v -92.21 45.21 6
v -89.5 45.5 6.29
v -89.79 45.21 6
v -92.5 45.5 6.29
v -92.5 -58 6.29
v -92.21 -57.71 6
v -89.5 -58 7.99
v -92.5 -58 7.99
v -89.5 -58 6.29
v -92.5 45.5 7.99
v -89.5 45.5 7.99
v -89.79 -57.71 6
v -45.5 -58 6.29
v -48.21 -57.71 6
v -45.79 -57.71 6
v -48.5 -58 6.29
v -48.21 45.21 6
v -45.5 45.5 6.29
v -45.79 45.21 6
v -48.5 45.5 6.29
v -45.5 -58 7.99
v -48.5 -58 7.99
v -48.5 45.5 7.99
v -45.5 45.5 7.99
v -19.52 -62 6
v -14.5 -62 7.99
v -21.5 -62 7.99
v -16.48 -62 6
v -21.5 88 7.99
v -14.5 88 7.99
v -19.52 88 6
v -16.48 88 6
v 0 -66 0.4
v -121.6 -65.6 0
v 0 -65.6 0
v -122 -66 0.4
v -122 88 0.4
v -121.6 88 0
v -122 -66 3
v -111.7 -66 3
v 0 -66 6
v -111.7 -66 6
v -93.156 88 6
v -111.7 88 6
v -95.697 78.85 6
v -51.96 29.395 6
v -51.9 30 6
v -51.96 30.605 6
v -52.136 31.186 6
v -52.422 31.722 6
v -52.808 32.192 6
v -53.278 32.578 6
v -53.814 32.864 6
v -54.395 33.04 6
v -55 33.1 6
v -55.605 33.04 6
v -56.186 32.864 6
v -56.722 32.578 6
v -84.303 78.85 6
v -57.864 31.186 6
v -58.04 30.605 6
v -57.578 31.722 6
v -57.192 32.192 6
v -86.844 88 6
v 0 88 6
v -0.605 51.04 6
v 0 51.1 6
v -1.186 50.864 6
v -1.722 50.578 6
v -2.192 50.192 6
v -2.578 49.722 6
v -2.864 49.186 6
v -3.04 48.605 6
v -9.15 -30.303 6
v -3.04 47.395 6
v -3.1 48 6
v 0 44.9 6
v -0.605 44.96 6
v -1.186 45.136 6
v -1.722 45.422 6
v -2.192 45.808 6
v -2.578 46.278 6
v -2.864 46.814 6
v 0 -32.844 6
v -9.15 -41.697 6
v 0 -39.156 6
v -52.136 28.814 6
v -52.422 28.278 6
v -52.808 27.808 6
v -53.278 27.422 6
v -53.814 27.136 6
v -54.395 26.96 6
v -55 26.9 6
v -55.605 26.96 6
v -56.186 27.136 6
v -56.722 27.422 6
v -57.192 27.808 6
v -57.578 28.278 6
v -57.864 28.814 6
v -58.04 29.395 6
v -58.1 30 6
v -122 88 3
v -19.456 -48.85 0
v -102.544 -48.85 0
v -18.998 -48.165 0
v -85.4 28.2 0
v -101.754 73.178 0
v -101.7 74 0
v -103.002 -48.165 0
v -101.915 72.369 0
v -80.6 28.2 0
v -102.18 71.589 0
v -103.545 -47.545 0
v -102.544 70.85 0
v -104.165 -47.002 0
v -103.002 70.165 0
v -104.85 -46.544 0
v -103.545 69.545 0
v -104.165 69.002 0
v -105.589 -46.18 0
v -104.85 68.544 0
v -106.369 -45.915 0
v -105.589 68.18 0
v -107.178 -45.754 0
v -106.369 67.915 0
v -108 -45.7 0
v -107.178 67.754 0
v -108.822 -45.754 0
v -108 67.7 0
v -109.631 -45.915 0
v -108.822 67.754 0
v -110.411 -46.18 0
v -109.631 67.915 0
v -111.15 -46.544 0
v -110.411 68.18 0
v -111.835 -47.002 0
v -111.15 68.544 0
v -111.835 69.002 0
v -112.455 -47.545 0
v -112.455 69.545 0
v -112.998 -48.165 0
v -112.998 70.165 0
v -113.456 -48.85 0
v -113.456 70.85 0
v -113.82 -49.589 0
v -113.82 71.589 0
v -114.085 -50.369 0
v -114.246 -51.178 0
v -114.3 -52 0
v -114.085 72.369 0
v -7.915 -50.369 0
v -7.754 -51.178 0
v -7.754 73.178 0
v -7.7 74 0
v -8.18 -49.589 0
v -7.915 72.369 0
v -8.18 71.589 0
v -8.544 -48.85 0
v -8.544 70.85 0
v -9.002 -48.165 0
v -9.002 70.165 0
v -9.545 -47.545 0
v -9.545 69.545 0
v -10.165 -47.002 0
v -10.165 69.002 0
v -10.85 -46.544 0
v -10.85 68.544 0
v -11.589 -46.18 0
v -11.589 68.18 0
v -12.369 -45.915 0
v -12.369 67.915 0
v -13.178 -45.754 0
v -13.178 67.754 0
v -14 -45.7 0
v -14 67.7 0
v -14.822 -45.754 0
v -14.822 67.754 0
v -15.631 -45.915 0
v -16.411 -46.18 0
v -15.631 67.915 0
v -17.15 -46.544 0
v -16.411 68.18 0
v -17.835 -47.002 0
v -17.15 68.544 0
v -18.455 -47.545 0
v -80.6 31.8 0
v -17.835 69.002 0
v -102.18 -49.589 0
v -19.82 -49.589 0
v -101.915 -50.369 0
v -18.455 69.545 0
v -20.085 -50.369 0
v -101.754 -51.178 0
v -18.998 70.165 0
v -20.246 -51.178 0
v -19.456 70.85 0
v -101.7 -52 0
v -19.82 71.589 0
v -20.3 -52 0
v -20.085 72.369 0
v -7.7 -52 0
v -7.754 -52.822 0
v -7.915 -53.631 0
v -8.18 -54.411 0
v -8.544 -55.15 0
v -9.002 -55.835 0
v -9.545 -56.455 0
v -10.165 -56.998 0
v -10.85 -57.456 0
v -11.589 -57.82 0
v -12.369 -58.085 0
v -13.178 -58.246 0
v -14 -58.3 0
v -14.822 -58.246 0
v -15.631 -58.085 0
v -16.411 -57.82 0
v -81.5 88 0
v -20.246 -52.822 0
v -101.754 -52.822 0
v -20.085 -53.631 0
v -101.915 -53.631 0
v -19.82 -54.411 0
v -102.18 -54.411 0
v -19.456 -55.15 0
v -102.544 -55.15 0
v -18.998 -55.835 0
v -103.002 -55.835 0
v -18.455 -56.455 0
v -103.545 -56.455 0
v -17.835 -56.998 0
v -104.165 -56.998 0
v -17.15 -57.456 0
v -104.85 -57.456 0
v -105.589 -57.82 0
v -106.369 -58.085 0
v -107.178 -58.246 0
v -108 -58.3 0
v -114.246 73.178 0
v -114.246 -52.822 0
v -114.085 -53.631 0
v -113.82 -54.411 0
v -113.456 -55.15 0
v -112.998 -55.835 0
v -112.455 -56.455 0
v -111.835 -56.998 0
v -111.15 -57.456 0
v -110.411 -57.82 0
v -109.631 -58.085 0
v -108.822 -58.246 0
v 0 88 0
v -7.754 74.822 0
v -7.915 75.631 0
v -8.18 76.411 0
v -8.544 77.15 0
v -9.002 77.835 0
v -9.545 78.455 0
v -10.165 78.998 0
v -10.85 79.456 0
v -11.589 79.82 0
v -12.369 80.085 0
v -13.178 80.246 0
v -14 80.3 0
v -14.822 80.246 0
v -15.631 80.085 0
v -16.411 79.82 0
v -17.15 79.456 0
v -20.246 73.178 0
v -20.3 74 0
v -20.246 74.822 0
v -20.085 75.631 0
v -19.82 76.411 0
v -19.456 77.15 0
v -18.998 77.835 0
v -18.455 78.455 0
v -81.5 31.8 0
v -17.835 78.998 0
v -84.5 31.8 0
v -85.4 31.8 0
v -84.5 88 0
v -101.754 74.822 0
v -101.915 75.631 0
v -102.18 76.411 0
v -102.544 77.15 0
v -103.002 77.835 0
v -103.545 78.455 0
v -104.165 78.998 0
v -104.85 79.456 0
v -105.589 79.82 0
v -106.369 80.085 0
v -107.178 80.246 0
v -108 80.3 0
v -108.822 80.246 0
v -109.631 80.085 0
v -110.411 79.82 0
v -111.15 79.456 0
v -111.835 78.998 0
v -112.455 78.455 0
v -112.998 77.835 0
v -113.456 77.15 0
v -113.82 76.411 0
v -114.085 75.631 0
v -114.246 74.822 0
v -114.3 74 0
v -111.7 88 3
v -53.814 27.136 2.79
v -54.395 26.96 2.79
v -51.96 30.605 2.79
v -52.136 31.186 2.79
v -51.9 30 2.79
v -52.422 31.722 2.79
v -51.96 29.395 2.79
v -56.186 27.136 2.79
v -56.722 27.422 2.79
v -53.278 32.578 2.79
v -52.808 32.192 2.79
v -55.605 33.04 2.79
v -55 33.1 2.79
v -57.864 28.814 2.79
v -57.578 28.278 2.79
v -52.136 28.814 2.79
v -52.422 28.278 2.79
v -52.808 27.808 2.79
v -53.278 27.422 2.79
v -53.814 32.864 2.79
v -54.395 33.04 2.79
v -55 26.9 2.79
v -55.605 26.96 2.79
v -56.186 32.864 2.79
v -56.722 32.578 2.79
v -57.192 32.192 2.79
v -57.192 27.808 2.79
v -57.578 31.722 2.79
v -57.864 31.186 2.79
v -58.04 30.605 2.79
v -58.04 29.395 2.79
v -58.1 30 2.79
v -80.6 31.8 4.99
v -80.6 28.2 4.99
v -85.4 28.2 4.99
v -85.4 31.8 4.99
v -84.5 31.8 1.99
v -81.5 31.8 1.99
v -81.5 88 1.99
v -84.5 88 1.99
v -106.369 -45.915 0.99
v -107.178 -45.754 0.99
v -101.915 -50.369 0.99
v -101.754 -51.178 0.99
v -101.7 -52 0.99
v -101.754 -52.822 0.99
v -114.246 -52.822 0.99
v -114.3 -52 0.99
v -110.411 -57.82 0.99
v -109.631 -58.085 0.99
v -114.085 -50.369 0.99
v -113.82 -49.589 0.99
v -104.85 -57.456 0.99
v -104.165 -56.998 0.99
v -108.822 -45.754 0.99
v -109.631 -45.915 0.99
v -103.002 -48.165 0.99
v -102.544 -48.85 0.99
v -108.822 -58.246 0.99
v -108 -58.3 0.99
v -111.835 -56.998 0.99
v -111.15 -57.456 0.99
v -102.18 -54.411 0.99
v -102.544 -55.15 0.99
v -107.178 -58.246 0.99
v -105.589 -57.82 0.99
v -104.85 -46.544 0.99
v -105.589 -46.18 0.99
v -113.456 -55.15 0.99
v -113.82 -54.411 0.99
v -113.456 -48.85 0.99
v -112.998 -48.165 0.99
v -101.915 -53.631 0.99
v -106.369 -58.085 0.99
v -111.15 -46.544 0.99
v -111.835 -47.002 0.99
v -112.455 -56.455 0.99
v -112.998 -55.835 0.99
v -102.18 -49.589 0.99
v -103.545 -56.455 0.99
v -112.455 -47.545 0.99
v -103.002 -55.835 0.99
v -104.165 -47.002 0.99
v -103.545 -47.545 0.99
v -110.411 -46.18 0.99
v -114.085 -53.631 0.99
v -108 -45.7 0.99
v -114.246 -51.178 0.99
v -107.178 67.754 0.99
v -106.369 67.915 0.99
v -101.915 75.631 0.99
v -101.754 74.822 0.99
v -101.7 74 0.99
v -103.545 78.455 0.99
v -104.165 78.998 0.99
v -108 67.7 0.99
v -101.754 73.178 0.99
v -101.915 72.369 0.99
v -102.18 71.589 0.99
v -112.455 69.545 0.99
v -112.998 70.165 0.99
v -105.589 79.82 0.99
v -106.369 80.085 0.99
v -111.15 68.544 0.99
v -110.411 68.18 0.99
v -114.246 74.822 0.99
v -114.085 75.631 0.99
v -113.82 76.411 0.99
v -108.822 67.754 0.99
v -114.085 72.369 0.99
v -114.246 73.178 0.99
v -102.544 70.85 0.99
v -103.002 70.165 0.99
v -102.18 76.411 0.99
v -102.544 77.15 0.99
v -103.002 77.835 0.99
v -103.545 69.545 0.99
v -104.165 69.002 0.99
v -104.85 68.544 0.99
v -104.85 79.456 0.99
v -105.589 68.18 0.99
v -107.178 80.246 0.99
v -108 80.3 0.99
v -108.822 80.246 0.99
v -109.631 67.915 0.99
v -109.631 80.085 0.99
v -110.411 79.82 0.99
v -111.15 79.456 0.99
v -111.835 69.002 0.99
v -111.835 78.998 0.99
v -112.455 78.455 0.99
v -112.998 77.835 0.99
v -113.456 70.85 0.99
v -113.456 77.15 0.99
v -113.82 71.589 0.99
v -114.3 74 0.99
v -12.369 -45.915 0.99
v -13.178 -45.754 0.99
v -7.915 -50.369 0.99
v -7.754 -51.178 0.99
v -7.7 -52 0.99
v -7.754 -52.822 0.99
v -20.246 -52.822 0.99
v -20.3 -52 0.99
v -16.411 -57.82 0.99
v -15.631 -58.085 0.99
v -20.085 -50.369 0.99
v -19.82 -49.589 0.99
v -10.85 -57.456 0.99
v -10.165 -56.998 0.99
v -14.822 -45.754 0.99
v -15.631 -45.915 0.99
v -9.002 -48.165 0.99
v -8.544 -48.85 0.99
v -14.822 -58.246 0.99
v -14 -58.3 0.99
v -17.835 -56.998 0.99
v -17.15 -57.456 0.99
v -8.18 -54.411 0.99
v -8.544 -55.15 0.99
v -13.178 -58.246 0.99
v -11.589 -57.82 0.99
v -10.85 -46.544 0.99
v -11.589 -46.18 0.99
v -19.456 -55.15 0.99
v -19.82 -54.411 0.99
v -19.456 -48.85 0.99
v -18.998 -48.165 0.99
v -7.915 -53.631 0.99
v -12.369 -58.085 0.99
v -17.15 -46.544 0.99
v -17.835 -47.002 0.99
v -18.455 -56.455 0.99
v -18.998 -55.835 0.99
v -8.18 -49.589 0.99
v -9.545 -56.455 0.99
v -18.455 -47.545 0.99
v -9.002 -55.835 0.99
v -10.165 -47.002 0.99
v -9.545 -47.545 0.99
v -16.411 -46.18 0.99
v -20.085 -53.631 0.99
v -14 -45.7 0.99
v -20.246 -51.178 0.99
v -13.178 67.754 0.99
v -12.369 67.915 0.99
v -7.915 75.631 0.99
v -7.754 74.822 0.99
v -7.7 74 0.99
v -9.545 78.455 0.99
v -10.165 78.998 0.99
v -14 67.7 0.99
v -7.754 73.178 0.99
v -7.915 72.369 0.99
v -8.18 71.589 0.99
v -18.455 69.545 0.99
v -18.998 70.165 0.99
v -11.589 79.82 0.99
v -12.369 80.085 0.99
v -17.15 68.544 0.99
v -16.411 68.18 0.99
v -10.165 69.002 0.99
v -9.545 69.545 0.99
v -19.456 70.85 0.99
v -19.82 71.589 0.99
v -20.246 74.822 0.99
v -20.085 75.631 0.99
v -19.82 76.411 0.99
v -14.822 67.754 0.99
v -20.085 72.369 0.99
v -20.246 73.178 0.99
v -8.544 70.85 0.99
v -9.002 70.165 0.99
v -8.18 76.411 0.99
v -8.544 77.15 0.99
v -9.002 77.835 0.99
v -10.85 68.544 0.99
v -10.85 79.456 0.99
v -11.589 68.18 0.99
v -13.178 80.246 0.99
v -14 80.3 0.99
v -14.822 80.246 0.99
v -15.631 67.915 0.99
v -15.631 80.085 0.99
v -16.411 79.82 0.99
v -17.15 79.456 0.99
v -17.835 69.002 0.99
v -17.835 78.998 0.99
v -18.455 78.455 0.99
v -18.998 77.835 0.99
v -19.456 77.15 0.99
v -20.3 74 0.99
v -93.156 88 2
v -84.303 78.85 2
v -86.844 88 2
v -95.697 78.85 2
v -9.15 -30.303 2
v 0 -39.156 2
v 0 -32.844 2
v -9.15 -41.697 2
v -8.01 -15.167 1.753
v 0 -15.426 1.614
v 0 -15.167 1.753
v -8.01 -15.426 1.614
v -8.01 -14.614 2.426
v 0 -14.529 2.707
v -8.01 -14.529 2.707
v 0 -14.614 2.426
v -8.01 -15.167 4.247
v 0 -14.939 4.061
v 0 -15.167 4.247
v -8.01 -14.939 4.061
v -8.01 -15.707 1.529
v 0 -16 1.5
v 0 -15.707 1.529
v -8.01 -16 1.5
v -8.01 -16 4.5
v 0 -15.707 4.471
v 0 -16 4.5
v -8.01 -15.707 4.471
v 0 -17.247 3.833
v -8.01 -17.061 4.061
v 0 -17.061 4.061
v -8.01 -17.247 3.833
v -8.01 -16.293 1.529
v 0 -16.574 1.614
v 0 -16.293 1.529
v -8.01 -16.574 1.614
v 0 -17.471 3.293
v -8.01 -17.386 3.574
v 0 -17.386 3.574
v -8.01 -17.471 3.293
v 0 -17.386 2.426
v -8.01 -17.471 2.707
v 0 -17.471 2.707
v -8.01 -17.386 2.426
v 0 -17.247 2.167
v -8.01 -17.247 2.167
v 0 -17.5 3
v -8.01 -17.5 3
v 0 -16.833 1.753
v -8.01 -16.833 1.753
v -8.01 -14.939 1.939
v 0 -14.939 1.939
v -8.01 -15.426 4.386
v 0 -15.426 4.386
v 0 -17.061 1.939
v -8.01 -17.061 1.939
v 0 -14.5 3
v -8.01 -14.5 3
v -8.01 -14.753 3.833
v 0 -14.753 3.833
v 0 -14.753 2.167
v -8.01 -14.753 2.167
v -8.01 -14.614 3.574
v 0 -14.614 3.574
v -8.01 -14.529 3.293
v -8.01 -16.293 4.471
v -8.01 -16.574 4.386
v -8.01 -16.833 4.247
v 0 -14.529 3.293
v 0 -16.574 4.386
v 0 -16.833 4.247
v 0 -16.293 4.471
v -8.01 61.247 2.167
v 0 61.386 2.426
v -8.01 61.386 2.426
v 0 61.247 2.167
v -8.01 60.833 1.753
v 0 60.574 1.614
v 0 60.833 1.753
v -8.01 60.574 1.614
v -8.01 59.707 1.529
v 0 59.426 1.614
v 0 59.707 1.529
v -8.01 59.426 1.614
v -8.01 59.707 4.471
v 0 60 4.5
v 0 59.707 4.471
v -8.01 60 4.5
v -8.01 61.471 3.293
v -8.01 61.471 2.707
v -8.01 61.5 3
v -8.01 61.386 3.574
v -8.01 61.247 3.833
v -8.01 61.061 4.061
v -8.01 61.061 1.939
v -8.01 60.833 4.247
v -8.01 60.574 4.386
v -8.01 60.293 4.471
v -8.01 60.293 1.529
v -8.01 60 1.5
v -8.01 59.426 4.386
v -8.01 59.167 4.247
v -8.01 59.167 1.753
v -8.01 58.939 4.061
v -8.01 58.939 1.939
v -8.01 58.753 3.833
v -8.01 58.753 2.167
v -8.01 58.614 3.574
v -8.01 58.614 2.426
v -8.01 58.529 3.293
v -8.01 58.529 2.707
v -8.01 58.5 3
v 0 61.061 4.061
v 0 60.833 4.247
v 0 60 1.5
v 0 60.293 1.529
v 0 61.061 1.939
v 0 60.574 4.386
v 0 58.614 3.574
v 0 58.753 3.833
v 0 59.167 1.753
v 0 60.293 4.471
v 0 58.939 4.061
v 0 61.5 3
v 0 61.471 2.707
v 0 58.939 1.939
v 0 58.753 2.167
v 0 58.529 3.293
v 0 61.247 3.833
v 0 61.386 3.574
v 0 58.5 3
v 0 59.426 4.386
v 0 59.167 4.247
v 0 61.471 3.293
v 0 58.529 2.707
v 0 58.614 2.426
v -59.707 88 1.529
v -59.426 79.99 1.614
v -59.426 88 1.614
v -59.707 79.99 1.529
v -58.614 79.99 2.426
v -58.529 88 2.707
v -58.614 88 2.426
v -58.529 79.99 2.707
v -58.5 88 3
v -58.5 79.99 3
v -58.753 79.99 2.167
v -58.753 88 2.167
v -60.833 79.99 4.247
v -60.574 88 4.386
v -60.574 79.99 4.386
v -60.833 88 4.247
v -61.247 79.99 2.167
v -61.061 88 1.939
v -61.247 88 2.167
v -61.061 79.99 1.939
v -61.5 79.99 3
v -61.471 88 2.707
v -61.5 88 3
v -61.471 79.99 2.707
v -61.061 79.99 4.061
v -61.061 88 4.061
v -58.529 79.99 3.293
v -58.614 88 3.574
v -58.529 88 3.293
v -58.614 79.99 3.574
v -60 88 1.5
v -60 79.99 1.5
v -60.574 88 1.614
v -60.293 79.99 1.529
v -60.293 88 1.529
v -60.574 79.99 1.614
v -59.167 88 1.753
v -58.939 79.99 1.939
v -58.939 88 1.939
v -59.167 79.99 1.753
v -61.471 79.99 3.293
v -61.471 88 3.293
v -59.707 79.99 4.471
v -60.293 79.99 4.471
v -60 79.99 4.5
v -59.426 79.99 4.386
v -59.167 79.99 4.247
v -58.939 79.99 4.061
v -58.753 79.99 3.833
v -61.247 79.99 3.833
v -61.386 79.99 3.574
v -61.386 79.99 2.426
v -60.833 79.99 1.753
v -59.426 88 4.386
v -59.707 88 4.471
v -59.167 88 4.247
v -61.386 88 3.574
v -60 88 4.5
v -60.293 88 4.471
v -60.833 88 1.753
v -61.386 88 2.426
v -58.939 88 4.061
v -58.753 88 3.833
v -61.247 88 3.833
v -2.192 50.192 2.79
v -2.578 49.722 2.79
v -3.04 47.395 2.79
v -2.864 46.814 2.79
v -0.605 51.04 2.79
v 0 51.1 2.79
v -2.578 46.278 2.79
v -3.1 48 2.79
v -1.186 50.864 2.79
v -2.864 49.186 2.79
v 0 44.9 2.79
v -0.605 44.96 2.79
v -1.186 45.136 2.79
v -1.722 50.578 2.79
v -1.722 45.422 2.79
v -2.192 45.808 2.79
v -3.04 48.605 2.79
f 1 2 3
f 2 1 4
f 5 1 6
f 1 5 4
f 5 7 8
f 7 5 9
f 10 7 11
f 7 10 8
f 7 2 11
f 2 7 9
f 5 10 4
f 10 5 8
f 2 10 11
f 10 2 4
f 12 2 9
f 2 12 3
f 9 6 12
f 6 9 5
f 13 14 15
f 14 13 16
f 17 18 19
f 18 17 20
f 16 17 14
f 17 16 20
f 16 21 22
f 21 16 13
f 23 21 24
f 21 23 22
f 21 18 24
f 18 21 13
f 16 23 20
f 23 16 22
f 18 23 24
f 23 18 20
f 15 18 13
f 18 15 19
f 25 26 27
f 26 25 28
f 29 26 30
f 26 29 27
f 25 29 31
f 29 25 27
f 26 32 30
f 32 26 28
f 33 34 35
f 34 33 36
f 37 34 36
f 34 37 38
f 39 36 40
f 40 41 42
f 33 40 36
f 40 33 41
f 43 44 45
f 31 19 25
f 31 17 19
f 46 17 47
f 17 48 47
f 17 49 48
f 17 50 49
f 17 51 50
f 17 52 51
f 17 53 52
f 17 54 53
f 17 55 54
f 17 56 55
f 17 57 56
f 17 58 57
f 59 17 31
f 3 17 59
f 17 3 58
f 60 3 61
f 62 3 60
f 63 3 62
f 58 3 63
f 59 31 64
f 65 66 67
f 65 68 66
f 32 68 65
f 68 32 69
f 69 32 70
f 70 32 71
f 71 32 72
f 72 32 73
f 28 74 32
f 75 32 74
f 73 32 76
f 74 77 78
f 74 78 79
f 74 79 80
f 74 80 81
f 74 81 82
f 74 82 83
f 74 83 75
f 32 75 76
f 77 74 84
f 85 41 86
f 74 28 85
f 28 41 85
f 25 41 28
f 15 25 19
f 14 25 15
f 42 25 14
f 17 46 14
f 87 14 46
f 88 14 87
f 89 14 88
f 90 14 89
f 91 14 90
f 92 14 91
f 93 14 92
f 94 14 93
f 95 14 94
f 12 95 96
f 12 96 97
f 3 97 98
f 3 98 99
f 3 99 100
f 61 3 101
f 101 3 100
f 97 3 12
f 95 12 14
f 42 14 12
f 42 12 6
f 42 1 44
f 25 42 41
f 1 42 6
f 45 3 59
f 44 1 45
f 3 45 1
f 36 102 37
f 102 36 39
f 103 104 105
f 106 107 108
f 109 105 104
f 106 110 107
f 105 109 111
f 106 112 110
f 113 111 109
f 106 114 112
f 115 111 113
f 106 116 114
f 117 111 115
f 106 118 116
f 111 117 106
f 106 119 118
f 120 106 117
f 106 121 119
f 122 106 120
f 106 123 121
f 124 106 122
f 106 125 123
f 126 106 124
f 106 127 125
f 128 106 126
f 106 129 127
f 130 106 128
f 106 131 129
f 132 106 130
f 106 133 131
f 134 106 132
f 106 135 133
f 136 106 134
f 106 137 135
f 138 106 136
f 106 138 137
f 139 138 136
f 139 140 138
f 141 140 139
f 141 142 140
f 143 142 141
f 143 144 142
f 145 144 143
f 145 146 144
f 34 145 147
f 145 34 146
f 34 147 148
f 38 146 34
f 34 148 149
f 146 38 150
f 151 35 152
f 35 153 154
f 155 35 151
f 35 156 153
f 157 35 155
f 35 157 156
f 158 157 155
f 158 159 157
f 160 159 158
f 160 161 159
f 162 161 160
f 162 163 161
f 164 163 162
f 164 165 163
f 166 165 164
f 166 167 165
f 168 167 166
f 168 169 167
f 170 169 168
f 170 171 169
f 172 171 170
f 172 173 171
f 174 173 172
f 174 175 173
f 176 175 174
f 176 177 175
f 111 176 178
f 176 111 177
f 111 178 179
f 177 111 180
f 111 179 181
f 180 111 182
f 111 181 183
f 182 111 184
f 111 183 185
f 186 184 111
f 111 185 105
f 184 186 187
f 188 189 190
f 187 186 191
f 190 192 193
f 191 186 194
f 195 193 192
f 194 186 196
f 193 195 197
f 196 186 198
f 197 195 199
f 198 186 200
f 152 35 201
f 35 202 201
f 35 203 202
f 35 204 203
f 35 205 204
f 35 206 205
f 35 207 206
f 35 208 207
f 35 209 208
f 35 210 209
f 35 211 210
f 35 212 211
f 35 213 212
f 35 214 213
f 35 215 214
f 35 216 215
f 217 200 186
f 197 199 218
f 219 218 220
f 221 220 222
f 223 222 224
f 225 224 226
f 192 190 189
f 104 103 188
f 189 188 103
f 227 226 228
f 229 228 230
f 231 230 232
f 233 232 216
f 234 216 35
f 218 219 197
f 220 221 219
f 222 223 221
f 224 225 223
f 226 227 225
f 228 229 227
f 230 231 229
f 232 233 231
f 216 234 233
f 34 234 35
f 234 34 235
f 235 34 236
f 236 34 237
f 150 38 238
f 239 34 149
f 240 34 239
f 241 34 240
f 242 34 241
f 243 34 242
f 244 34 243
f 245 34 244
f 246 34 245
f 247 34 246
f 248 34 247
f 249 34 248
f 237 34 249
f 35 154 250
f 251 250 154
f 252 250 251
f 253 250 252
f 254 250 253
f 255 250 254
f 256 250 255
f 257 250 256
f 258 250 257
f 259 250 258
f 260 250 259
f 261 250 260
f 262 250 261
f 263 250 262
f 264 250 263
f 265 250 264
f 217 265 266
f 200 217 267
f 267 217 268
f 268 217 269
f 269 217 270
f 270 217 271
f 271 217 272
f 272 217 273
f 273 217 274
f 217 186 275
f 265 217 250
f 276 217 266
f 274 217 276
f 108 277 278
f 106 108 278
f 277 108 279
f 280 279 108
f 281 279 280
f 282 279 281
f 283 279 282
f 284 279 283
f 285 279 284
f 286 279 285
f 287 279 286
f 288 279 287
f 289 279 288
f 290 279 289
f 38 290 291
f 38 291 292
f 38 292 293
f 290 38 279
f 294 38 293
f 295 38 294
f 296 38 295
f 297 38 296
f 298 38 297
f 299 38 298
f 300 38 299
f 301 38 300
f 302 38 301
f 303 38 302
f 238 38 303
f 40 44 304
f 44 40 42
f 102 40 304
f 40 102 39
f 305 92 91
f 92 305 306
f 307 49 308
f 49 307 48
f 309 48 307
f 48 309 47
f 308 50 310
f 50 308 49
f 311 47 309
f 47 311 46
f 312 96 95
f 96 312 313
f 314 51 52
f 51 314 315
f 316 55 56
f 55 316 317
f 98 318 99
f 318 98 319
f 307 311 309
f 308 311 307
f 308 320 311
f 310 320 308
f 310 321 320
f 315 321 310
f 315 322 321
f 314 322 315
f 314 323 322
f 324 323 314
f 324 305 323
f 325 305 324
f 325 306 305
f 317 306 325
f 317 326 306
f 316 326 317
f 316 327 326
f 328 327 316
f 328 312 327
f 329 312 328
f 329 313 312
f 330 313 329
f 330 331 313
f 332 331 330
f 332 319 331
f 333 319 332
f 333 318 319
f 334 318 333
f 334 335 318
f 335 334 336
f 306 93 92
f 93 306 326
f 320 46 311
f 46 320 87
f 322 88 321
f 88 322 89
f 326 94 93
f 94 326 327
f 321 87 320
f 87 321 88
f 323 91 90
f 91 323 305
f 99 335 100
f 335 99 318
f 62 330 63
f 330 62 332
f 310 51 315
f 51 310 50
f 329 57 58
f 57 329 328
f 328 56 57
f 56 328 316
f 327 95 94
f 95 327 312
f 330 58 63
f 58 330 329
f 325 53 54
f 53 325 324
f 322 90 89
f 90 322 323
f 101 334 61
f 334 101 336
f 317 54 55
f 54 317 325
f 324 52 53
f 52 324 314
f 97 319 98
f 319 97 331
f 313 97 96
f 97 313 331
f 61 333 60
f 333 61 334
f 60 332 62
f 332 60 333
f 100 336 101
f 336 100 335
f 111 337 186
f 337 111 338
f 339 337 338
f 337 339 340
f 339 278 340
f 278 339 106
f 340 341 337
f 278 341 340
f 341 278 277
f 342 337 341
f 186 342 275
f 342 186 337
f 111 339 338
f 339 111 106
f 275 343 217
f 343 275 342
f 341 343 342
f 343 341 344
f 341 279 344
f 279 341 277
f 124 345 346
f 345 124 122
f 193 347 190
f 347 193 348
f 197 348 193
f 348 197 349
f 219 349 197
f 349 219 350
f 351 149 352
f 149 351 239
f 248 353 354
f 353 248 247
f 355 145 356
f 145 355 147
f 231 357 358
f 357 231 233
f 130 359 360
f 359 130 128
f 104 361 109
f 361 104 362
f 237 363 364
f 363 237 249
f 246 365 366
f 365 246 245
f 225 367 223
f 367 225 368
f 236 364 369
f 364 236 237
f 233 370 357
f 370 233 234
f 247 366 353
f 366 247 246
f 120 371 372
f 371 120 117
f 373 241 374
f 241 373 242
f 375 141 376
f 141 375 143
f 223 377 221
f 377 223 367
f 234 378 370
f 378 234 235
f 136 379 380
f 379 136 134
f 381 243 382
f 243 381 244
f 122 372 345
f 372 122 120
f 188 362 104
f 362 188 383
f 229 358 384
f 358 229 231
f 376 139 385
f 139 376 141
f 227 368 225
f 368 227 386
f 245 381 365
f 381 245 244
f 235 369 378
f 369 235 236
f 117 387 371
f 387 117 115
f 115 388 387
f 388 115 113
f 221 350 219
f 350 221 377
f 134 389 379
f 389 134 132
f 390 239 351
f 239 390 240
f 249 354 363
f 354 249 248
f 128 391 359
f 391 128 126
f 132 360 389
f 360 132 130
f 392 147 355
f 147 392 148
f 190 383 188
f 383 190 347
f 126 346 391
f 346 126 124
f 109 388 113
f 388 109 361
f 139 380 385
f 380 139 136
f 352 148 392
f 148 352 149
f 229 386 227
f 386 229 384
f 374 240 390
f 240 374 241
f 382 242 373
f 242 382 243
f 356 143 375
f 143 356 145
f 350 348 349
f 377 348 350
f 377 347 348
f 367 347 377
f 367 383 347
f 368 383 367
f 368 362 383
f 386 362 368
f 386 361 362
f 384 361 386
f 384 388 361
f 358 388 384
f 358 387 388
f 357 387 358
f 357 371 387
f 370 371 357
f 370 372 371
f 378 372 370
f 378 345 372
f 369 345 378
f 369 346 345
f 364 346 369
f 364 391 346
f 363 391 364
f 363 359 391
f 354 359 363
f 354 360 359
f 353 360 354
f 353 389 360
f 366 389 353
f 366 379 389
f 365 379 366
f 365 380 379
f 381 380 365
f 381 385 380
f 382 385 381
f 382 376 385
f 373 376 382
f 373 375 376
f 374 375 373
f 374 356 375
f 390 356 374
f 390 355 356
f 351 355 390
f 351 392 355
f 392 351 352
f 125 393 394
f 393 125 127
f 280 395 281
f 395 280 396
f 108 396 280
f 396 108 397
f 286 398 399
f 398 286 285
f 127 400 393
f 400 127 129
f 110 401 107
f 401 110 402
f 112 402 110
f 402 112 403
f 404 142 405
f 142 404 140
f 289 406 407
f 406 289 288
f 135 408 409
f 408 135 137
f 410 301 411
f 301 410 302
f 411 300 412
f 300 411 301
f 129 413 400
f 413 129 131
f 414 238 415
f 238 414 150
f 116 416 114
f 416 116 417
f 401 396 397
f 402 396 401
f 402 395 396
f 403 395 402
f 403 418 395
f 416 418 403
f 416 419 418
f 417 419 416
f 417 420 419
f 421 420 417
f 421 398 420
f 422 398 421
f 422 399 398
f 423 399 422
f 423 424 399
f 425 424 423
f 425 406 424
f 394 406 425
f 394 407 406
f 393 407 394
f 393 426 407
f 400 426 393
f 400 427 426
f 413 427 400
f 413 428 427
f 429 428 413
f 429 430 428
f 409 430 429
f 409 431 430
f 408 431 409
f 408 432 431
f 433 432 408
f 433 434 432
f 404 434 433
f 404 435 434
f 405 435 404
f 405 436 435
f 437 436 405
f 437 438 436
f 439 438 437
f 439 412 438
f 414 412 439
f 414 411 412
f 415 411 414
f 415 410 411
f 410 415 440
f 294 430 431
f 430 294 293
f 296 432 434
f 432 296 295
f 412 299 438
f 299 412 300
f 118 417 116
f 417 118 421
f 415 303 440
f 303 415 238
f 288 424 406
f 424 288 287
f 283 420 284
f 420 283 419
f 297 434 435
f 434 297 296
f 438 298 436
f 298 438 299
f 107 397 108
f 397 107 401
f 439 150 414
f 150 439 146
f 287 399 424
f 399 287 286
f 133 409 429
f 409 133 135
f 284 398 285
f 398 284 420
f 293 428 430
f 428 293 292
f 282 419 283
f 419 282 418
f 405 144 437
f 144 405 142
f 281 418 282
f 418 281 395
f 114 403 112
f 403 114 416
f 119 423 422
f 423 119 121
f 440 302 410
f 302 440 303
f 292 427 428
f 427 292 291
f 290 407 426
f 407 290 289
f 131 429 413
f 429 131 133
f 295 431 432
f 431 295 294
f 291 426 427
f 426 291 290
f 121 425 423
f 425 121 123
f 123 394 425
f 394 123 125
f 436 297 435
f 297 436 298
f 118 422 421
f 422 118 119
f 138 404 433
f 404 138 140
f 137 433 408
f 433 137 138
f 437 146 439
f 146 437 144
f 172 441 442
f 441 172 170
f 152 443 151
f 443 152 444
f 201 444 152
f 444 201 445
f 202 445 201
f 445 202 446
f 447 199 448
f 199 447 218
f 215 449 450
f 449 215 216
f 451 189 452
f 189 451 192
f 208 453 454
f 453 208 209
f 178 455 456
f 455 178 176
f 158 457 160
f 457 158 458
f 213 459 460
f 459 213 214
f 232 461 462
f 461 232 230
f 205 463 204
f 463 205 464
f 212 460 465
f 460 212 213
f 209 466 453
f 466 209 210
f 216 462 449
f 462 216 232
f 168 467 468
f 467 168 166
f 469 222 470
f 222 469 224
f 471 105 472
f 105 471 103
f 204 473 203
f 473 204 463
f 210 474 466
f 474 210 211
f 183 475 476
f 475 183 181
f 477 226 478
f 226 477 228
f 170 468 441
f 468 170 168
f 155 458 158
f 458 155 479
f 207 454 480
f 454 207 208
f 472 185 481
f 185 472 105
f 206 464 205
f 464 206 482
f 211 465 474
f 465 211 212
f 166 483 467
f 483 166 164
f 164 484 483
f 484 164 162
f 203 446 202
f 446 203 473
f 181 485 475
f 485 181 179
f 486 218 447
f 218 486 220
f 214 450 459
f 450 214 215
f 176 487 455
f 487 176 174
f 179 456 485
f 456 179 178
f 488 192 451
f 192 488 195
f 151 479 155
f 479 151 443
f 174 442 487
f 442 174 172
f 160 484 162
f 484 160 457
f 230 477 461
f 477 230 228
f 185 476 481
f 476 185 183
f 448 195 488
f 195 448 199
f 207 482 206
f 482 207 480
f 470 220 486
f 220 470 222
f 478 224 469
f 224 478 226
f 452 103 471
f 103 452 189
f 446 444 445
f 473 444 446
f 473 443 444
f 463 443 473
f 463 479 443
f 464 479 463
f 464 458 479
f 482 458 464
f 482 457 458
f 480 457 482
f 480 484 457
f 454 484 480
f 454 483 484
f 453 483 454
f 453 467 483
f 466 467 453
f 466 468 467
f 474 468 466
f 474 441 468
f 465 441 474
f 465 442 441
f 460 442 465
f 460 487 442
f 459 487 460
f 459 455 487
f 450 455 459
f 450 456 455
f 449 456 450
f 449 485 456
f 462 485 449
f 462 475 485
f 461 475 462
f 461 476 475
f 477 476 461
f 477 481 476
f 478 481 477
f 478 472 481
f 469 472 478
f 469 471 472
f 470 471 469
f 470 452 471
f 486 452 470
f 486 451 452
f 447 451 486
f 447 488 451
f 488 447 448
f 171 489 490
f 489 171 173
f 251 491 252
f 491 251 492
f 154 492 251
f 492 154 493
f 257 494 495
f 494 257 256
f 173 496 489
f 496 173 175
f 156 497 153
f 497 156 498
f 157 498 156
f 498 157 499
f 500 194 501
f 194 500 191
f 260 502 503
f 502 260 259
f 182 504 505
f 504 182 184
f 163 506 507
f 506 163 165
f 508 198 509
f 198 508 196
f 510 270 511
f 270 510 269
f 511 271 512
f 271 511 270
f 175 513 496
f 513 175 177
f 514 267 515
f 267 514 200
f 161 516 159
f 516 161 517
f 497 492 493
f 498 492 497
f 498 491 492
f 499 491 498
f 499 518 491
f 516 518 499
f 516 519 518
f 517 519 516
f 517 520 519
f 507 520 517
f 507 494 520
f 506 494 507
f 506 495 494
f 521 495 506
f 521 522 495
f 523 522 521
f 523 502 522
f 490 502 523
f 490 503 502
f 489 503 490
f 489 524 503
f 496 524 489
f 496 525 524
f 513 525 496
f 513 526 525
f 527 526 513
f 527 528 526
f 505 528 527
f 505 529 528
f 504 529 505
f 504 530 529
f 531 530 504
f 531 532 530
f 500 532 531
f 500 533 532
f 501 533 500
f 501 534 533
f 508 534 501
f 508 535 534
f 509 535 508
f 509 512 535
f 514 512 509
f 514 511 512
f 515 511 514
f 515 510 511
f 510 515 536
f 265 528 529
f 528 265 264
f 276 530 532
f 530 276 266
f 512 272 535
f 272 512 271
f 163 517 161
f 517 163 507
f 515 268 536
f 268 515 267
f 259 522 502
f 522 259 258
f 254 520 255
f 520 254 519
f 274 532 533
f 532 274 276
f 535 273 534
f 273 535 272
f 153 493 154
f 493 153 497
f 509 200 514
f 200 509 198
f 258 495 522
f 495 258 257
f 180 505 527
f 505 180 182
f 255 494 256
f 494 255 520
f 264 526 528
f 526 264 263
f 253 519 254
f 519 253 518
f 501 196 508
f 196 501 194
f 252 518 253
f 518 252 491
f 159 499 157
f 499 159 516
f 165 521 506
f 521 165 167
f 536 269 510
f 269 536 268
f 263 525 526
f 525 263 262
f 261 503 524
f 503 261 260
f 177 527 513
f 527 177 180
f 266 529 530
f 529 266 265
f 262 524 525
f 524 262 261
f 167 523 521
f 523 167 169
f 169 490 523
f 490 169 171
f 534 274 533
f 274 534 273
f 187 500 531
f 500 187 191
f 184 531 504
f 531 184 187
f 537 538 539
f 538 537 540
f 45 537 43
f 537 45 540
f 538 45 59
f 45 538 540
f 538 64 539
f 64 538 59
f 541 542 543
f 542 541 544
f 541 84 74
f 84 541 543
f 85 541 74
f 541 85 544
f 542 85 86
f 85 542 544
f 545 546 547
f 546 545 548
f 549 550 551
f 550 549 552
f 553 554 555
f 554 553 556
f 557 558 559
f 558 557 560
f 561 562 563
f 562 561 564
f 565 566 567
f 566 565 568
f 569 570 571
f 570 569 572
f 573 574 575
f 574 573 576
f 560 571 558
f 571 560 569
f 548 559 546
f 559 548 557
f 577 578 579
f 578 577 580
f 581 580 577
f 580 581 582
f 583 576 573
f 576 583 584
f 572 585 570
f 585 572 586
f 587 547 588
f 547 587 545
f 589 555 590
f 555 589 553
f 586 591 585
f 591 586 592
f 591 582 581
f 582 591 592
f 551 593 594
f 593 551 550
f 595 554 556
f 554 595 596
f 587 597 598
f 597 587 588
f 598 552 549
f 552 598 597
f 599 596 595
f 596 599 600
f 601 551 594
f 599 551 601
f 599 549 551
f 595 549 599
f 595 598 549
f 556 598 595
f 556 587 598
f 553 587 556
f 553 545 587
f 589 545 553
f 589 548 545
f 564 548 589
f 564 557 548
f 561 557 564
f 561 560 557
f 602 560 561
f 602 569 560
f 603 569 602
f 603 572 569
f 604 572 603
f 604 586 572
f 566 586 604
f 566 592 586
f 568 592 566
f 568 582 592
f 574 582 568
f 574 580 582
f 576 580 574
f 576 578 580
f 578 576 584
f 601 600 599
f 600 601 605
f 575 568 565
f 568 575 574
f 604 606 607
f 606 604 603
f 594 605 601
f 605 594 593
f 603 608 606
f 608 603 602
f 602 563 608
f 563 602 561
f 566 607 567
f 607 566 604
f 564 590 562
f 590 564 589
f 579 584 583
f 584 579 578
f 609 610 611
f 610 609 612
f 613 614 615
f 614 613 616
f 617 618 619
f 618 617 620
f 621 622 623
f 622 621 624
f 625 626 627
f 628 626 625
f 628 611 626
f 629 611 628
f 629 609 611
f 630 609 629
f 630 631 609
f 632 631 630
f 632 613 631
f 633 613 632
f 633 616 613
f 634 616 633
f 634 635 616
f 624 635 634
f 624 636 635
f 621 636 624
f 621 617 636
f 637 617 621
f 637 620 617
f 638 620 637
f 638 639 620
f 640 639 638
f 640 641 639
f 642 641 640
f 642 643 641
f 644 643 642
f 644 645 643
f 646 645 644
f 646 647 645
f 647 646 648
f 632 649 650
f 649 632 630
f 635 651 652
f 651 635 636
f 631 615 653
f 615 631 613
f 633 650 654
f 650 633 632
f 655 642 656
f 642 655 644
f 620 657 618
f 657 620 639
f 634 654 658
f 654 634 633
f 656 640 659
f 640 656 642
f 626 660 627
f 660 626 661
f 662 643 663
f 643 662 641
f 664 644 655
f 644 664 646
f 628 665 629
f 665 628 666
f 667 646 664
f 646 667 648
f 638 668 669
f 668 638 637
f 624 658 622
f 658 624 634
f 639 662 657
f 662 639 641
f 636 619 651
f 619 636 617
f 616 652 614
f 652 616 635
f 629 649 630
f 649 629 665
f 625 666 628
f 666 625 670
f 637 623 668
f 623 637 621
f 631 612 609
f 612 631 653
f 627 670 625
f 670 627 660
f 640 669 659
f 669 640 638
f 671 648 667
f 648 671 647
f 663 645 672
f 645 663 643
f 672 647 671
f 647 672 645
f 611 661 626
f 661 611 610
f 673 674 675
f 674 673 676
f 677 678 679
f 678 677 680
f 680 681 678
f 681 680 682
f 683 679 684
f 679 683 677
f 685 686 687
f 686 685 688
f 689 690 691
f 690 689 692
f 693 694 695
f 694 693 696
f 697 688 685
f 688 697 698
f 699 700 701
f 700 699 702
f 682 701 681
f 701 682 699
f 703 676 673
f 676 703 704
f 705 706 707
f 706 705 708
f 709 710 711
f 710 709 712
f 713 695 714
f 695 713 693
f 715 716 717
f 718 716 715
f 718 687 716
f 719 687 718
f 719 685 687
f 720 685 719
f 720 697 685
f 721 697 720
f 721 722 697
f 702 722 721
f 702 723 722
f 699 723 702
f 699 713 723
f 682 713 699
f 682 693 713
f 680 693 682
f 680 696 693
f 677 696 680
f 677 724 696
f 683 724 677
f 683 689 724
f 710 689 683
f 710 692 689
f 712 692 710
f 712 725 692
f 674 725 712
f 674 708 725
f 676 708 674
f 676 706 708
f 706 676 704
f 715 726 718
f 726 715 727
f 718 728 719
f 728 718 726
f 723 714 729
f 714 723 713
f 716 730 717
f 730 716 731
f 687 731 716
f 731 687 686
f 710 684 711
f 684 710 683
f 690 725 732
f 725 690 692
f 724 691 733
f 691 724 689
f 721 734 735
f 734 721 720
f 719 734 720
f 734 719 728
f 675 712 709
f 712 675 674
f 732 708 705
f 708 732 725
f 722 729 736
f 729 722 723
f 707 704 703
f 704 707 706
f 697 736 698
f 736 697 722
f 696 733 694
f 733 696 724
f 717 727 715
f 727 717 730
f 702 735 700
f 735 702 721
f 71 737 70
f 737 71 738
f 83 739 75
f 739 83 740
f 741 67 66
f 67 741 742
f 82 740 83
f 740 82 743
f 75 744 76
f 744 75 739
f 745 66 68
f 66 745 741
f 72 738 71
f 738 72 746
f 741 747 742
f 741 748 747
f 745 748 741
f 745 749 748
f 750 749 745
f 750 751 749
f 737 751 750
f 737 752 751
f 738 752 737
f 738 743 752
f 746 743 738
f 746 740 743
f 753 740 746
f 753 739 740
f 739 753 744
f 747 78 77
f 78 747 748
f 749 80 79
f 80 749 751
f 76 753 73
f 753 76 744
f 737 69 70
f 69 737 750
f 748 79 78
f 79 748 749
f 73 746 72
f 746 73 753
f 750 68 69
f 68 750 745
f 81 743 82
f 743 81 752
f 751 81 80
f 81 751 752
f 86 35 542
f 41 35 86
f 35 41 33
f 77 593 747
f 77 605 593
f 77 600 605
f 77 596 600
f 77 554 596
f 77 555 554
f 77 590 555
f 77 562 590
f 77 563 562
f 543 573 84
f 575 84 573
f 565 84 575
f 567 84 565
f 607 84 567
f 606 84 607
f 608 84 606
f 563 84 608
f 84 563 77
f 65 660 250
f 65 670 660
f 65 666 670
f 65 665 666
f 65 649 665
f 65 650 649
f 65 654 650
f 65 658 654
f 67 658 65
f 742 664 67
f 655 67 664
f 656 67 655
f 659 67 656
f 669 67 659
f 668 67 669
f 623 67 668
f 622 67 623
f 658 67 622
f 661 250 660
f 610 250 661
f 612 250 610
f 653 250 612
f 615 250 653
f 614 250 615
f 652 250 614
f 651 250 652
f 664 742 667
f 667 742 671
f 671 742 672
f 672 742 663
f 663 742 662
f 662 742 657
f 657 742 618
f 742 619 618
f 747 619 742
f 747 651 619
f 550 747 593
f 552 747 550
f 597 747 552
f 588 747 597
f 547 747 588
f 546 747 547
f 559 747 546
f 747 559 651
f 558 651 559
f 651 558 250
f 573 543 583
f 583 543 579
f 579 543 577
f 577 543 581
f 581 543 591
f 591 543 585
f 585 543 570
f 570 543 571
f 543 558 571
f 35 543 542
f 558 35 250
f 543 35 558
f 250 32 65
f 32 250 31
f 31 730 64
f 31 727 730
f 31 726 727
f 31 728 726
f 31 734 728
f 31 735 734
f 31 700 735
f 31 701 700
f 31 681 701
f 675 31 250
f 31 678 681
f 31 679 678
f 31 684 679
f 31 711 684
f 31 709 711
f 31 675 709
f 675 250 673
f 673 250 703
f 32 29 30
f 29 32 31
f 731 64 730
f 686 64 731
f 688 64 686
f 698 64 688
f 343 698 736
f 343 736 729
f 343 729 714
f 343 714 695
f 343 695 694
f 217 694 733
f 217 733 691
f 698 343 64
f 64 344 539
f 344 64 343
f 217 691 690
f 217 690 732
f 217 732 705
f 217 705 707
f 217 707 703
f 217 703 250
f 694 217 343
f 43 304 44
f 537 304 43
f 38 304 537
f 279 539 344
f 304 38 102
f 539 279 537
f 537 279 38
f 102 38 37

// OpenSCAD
// Sorter Mk2, one part (or one small set) at a time in machine coordinates, for the picture
// assembly guide (guide/build_guide.py): openscad -D 'a="..."' -o w/a_<name>.stl scene_atoms.scad
include <etray.scad>      // brings joints + layout, and the tray's board positions
use <frame.scad>
use <levels.scad>
use <scan.scad>
use <feeder.scad>
use <covers.scad>
part = "none";            // etray.scad draws nothing
a = "base_fl";

// as frame.scad / levels.scad (variables don't pass through `use`)
zrows = [[wall_z0, seam_z[0]], [seam_z[0], seam_z[1]], [seam_z[1], top_z]];
ycols = [[front_y, seam_y], [seam_y, back_y]];
chan_z = [etray_z1 - 20, top_z - 40];
lid_len = (chan_z[1] - chan_z[0]) / 3 - 0.5;
base_tiles = [["fl", [-wall_out - 1, 0], [front_y - 1, base_seam_y]], ["fr", [0, wall_out + 1], [front_y - 1, base_seam_y]],
              ["bl", [-wall_out - 1, 0], [base_seam_y, back_y + 1]], ["br", [0, wall_out + 1], [base_seam_y, back_y + 1]]];
module key_across_y() multmatrix([[0, 0, -1, 0], [1, 0, 0, 0], [0, -1, 0, 0], [0, 0, 0, 1]]) children();
module key_across_z() multmatrix([[0, 0, -1, 0], [0, 1, 0, 0], [1, 0, 0, 0], [0, 0, 0, 1]]) children();
module into_face_run_z() multmatrix([[0, 0, -1, 0], [-1, 0, 0, 0], [0, 1, 0, 0], [0, 0, 0, 1]]) children();
module wall_keys() {      // the right wall's 9 keys, in their sockets on the inside face
    for (zz = zrows) translate([wall_in, seam_y, (zz[0] + zz[1]) / 2]) key_across_y() translate([0, 0, -key_t]) key();
    for (sz = seam_z) for (y = [front_y + 40, seam_y + 40, back_in - 40]) translate([wall_in, y, sz]) key_across_z() translate([0, 0, -key_t]) key();
}
module board(at, sz, h = 1.6) translate([at[0], at[1], base_top + et_floor + stand]) cube([sz[0], sz[1], h]);

for (t = base_tiles) if (a == str("base_", t[0])) base_tile(t);
if (a == "base_keys") {
    for (x = [-90, 90]) translate([x, base_seam_y, base_top - key_t]) rotate([0, 0, 90]) key();
    for (y = [front_y + 30, base_seam_y + 60, back_y - 30]) translate([0, y, base_top - key_t]) key();
}
for (iy = [0, 1]) for (iz = [0 : 2]) if (a == str("wall_r", iy, iz)) wall_tile("r", iy, iz);
if (a == "wall_keys") wall_keys();
if (a == "wall_r") wall_r();
if (a == "wall_l") wall_l();
if (a == "lv1_frame") lv1_frame();
if (a == "lv2_frame") lv2_frame();
if (a == "carriage1") carriage_at(lv1_z, 1, 0);
if (a == "carriage2") carriage_at(lv2_z, 2, 0);
if (a == "lever1") lever_at(lv1_z, 0);
if (a == "lever2") lever_at(lv2_z, 0);
if (a == "pin1") lever_pin_at(lv1_z, 0);
if (a == "pin2") lever_pin_at(lv2_z, 0);
if (a == "psv1") servos_at(0, "push1");
if (a == "psv2") servos_at(0, "push2");
if (a == "dsv") servos_at(0, "doors");
if (a == "doors") { door_at(lv1_z, false, 0); door_at(lv1_z, true, 0); }
if (a == "dcp") { coupler_at(lv1_z, false, 0); coupler_at(lv1_z, true, 0); }
if (a == "col_front") col_front();
if (a == "liner_back") liner_back();
if (a == "ir") ir_holders_at();
if (a == "carrier") carrier();
if (a == "bed") bed();
if (a == "lightbars") { lightbar(1); lightbar(-1); }
if (a == "stop_bar") stop_bar(0);
if (a == "stop_sv") stop_servo_placed();
if (a == "cam_arch") cam_arch();
if (a == "cam_hood") cam_hood();
if (a == "stand") stand();
if (a == "motor_lid") motor_lid();
if (a == "roller") roller();
if (a == "n20") n20();
if (a == "hopper") hopper();
if (a == "shoe") shoe();
if (a == "pads") pads();
if (a == "etray") etray();
if (a == "pi") board(pi_at, pi_sz);
if (a == "pca") board(pca_at, pca_sz);
if (a == "drv") board(drv_at, drv_sz, 4);
if (a == "relay") translate([relay_at[0], relay_at[1], base_top + et_floor + 1]) cube(relay_sz);
if (a == "wago") translate([wago_at[0], wago_at[1], base_top + et_floor + 1]) cube(wago_sz);
if (a == "lids") for (m = [0, 1]) mirror([m, 0, 0]) for (k = [0 : 2]) translate([wall_in, chan_y, chan_z[0] + k * (lid_len + 0.5)]) into_face_run_z() trunk_lid("");
if (a == "front_cover") front_cover();
if (a == "back_low") back_low();
if (a == "back_high") back_high();
if (a == "lid_front") lid_front();
if (a == "lid_back") lid_back();
if (a == "drawer") drawer();
for (i = [0 : 3]) if (a == str("bin", i)) bin_at(i);
